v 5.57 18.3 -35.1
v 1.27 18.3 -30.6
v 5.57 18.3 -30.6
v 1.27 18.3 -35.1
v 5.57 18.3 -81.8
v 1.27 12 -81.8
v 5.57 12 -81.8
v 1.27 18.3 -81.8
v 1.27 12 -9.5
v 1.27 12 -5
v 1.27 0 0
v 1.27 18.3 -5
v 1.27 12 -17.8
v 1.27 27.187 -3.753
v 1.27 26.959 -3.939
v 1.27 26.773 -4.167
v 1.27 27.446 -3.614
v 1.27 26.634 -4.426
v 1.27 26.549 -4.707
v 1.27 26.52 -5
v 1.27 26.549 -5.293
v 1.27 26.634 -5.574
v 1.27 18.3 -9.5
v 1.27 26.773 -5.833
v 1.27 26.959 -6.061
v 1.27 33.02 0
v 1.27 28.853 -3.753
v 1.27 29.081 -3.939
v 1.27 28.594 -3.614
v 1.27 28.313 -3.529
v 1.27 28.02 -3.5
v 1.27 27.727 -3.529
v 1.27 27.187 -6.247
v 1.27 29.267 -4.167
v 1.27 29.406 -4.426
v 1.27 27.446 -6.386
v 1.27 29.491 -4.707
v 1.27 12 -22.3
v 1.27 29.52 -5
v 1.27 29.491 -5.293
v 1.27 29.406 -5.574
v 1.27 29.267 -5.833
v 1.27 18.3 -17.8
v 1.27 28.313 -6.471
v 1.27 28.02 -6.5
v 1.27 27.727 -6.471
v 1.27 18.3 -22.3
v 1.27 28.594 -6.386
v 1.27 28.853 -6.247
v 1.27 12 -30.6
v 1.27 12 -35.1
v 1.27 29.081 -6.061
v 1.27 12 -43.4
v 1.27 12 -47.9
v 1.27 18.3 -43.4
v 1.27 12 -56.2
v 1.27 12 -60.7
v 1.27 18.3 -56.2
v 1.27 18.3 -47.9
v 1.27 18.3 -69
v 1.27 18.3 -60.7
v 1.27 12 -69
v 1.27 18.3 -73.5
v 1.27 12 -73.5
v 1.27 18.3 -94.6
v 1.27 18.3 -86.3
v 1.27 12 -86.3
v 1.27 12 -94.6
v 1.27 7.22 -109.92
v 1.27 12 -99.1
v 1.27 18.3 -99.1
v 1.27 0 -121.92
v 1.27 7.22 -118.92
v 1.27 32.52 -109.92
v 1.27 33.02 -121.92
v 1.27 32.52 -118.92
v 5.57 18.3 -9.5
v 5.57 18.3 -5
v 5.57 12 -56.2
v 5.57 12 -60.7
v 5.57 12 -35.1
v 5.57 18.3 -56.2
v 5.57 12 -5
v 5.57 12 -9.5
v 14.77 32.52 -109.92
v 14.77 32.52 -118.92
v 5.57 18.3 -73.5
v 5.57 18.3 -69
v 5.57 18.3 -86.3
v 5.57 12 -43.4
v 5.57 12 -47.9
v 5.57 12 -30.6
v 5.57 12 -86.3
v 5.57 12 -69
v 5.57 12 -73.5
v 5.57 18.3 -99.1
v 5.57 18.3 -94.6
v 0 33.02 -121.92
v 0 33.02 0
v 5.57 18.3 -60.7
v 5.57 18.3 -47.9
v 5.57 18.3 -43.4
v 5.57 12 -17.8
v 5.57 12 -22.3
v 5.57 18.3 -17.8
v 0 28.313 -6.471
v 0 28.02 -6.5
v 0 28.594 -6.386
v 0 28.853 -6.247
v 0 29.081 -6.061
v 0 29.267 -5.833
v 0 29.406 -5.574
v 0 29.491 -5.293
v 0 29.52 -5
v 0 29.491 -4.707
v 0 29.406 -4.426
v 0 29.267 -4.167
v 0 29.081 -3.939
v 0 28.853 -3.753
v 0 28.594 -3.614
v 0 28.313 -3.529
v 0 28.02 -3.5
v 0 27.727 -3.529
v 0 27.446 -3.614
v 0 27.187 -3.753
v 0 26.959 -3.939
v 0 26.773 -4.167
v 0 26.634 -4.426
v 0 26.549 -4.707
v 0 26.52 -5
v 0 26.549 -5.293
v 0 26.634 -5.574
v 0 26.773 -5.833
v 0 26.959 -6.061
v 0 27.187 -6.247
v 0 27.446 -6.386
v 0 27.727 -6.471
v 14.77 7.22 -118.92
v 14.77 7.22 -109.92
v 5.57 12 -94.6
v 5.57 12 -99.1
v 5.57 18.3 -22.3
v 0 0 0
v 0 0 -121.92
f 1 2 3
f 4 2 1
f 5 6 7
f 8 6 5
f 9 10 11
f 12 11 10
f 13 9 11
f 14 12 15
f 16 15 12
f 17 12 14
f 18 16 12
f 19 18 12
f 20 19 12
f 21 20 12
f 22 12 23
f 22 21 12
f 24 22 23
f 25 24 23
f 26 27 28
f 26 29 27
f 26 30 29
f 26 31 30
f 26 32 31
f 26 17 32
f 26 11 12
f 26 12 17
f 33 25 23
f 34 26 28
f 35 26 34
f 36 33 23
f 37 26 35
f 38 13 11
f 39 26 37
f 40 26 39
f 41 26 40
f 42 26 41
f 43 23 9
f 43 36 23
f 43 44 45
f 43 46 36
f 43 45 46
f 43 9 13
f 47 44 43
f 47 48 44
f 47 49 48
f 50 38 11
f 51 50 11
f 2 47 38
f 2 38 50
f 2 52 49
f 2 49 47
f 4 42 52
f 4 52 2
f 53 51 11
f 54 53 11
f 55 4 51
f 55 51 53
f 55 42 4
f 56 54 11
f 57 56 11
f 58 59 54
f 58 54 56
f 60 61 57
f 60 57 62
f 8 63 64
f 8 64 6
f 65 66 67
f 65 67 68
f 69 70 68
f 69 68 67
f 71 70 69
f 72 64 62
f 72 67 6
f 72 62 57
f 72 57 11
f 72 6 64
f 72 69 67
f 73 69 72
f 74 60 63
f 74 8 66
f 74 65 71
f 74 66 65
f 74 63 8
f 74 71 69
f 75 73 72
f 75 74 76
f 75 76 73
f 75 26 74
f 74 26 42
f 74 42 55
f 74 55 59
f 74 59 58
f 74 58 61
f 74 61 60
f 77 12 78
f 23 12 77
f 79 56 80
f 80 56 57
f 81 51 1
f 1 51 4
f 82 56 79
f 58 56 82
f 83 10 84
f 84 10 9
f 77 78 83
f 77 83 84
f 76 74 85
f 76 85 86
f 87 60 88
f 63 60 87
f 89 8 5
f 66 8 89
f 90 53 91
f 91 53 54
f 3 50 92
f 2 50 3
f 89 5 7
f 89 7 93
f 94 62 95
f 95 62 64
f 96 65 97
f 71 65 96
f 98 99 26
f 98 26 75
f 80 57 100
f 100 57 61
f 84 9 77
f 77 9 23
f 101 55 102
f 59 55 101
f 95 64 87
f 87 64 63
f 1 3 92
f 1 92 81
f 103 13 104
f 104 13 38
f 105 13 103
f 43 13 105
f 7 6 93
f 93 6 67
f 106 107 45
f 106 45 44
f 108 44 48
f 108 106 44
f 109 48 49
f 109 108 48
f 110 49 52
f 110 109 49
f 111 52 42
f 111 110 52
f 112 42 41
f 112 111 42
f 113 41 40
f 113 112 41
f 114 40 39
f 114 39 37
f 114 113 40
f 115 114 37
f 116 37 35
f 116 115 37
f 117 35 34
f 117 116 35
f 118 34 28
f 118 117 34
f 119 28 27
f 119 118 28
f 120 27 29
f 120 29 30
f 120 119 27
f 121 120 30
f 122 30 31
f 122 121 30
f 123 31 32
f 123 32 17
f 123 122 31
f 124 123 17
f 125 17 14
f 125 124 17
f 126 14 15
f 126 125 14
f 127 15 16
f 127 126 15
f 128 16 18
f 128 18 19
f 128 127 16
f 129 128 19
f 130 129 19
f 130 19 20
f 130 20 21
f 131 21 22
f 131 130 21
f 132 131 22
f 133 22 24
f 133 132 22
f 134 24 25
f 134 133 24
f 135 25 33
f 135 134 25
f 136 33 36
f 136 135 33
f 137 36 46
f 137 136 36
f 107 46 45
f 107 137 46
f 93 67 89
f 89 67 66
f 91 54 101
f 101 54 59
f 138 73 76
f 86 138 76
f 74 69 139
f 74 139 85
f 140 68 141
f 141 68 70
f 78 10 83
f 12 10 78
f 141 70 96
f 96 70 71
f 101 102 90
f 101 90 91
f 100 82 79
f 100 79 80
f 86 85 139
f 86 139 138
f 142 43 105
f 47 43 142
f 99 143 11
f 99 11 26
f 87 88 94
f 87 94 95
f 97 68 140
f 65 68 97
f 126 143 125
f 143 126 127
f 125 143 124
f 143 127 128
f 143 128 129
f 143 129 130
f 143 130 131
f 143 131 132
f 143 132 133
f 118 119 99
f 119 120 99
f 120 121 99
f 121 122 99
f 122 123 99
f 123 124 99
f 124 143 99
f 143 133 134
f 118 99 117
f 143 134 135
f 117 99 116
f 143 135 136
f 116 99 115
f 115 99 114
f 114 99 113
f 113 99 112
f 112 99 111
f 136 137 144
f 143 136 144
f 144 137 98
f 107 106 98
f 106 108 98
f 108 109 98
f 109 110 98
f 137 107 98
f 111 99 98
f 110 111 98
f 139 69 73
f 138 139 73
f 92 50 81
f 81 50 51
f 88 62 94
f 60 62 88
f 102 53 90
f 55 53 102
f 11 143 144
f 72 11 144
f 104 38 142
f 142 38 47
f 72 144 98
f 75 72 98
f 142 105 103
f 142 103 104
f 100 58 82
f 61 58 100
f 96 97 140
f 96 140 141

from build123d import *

# Parameters (mm, degrees)
SKETCH1_W           = 121.92
SKETCH1_H           = 33.02
SKETCH1_R           = 1.5
BOSS_EXTRUDE1_DEPTH = 1.27
SKETCH2_W           = 9
SKETCH2_H           = 25.3
BOSS_EXTRUDE2_DEPTH = 13.5
SKETCH3_W           = 4.5
SKETCH3_H           = 6.3
BOSS_EXTRUDE3_DEPTH = 4.3


with BuildPart() as part:
    # Sketch1 → Boss-Extrude1 (new body)
    with BuildSketch(Plane(origin=(0, 0, 0), x_dir=(0, 0, -1), z_dir=(1, 0, 0))):
        with Locations((60.96, 16.51)):
            Rectangle(SKETCH1_W, SKETCH1_H)
        with Locations((5, 28.02)):
            Circle(SKETCH1_R, mode=Mode.SUBTRACT)
    extrude(amount=BOSS_EXTRUDE1_DEPTH)

    # Sketch2 → Boss-Extrude2 (add)
    with BuildSketch(Plane(origin=(1.27, 0, 0), x_dir=(0, 0, -1), z_dir=(1, 0, 0))):
        with Locations((114.42, 19.87)):
            Rectangle(SKETCH2_W, SKETCH2_H)
    extrude(amount=BOSS_EXTRUDE2_DEPTH)

    # Sketch3 → Boss-Extrude3 (add)
    with BuildSketch(Plane(origin=(1.27, 0, 0), x_dir=(0, 0, -1), z_dir=(1, 0, 0))):
        with Locations((7.25, 15.15)):
            Rectangle(SKETCH3_W, SKETCH3_H)
        with Locations((20.05, 15.15)):
            Rectangle(SKETCH3_W, SKETCH3_H)
        with Locations((32.85, 15.15)):
            Rectangle(SKETCH3_W, SKETCH3_H)
        with Locations((45.65, 15.15)):
            Rectangle(SKETCH3_W, SKETCH3_H)
        with Locations((58.45, 15.15)):
            Rectangle(SKETCH3_W, SKETCH3_H)
        with Locations((71.25, 15.15)):
            Rectangle(SKETCH3_W, SKETCH3_H)
        with Locations((84.05, 15.15)):
            Rectangle(SKETCH3_W, SKETCH3_H)
        with Locations((96.85, 15.15)):
            Rectangle(SKETCH3_W, SKETCH3_H)
    extrude(amount=BOSS_EXTRUDE3_DEPTH)


solid = part.part
